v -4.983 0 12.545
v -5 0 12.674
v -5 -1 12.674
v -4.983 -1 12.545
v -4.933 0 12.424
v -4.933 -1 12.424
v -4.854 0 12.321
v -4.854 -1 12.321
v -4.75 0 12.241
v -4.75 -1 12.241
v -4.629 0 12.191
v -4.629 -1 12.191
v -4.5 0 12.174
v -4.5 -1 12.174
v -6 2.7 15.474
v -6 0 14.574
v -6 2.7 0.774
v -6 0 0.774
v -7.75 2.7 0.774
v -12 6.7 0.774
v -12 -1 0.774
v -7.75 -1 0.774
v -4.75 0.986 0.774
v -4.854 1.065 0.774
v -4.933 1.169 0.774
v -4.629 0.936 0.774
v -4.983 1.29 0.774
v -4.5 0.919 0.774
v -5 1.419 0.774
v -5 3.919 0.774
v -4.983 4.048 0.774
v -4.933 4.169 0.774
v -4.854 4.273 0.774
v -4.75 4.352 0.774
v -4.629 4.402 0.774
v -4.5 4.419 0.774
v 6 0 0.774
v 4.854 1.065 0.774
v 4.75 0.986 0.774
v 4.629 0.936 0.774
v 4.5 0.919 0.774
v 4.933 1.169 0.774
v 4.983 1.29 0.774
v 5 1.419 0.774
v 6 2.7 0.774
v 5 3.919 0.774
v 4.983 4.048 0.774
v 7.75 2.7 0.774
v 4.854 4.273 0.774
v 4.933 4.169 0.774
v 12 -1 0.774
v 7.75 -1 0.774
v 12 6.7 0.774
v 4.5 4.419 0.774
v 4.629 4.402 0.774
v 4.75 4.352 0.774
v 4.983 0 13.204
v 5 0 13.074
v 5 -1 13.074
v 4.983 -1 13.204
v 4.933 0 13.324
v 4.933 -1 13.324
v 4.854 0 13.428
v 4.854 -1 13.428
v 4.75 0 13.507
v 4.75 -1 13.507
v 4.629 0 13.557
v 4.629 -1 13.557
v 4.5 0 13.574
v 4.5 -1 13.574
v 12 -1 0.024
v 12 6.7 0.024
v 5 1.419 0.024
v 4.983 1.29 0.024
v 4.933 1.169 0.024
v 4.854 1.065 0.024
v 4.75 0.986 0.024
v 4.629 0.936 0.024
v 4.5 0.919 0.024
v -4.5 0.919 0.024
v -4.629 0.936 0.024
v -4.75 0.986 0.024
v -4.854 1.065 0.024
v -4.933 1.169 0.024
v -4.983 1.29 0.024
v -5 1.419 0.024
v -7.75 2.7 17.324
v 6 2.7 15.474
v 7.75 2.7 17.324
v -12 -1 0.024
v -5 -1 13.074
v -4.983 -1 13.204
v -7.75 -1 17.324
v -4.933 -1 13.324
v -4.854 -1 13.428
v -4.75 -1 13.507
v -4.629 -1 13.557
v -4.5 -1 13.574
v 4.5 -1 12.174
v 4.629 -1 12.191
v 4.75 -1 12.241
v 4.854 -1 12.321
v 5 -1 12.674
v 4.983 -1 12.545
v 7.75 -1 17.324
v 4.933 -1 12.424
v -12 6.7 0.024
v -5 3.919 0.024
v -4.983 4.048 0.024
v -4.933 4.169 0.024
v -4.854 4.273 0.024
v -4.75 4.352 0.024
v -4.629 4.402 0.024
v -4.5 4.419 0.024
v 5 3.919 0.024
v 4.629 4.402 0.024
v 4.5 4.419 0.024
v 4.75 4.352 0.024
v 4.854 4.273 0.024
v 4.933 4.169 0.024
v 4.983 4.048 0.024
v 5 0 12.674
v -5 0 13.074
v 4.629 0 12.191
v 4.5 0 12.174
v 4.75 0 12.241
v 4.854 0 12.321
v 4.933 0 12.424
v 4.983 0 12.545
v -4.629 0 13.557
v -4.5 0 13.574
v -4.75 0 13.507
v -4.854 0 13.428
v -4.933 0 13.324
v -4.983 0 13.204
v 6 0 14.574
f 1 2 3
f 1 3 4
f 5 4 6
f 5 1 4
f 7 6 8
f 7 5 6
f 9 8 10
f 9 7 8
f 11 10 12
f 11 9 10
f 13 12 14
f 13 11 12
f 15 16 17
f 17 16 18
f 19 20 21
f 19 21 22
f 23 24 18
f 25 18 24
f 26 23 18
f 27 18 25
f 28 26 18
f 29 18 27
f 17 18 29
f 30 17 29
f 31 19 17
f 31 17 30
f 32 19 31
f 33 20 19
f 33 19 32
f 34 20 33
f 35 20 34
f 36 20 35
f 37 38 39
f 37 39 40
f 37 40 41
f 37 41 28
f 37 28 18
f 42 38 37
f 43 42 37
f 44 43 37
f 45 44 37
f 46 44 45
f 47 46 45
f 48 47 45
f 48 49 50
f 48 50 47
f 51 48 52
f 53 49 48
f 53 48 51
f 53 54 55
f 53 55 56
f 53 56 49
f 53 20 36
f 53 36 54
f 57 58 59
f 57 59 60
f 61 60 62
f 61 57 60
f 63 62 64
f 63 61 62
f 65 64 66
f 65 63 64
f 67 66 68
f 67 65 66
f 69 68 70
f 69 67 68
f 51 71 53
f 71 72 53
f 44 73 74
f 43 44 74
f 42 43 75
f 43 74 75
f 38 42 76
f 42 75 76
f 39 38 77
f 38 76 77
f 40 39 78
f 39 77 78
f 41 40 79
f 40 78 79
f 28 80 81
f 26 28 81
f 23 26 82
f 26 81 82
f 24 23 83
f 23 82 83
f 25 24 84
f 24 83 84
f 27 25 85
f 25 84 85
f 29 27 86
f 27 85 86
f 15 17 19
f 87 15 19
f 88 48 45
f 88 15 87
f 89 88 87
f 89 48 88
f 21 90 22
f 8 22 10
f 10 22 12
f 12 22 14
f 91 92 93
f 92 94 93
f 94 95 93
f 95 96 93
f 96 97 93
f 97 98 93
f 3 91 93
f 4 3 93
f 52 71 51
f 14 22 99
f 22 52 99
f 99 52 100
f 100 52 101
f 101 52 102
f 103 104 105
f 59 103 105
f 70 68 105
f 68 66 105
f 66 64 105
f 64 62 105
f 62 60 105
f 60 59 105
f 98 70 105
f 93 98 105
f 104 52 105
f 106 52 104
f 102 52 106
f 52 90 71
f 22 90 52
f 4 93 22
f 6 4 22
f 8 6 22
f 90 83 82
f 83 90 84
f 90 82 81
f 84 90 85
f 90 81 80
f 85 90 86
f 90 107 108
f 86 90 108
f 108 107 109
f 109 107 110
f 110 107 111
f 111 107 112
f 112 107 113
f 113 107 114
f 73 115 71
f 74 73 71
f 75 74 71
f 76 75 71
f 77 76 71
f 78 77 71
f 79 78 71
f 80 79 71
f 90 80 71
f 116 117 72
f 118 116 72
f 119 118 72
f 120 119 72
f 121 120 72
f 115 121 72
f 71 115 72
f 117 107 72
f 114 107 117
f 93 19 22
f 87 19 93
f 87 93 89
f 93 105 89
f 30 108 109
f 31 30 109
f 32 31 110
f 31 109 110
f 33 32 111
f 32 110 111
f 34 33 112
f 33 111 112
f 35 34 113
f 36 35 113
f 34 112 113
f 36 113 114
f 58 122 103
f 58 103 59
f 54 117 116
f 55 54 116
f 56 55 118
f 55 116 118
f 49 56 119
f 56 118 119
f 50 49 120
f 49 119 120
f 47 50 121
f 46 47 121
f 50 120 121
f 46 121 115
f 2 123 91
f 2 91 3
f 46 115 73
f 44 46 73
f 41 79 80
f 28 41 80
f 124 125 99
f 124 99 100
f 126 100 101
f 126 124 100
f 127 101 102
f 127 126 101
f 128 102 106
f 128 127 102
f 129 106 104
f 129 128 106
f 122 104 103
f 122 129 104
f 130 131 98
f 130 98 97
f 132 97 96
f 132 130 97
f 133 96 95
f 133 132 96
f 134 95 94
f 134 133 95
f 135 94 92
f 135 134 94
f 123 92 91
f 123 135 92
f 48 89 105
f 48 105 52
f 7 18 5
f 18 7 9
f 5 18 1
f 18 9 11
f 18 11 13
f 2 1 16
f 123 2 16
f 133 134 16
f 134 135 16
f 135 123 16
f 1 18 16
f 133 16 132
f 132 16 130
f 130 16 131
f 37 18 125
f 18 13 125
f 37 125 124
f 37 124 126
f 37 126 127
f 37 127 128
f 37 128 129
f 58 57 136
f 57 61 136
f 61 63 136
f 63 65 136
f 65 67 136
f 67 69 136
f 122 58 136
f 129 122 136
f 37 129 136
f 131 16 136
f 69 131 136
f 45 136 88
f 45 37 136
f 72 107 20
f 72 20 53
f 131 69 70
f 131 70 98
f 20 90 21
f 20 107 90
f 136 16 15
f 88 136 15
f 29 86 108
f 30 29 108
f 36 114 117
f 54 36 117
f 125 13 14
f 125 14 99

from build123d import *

# Parameters (mm, degrees)
SKETCH4_W           = 13.5
SKETCH4_H           = 15.3
SKETCH4_W_2         = 12
SKETCH4_H_2         = 13.8
BOSS_EXTRUDE1_DEPTH = 2.7
SKETCH5_W           = 13.5
SKETCH5_H           = 15.3
BOSS_EXTRUDE2_DEPTH = 1
SKETCH6_W           = 24
SKETCH6_H           = 0.75
BOSS_EXTRUDE3_DEPTH = 4
CUT_EXTRUDE1_REACH  = 22.566
SKETCH8_W           = 5.25
SKETCH8_H           = 0.75
BOSS_EXTRUDE4_DEPTH = 3.7
SKETCH9_W           = 5.25
SKETCH9_H           = 0.75
BOSS_EXTRUDE5_DEPTH = 3.7
SKETCH10_W          = 13.5
SKETCH10_H          = 3.7
BOSS_EXTRUDE6_DEPTH = 2
CHAMFER1_SIZE       = 2.7
CHAMFER1_SIZE_2     = 0.9
SKETCH11_W          = 16.55
SKETCH11_H          = 3.7
BOSS_EXTRUDE7_DEPTH = 1
SKETCH12_W          = 16.55
SKETCH12_H          = 3.7
BOSS_EXTRUDE8_DEPTH = 1
CUT_EXTRUDE2_REACH  = 24.114


with BuildPart() as part:
    # Sketch4 → Boss-Extrude1 (new body)
    with BuildSketch(Plane(origin=(0, 0, 0), x_dir=(1, 0, 0), z_dir=(0, 1, 0))):
        with Locations((0, -7.674098898)):
            Rectangle(SKETCH4_W, SKETCH4_H)
        with Locations((0, -7.674098898)):
            Rectangle(SKETCH4_W_2, SKETCH4_H_2, mode=Mode.SUBTRACT)
    extrude(amount=BOSS_EXTRUDE1_DEPTH)

    # Sketch5 → Boss-Extrude2 (add)
    with BuildSketch(Plane.XZ):
        with Locations((0, 7.674098898)):
            Rectangle(SKETCH5_W, SKETCH5_H)
    extrude(amount=BOSS_EXTRUDE2_DEPTH)

    # Sketch6 → Boss-Extrude3 (add)
    with BuildSketch(Plane(origin=(0, 2.7, 0), x_dir=(1, 0, 0), z_dir=(0, 1, 0))):
        with Locations((0, -0.399098898)):
            Rectangle(SKETCH6_W, SKETCH6_H)
    extrude(amount=BOSS_EXTRUDE3_DEPTH)

    # Sketch7 → Cut-Extrude1 (cut, up to next)
    with BuildSketch(Plane(origin=(0, 0, 0.024098898), x_dir=(-1, 0, 0), z_dir=(0, 0, -1)), mode=Mode.PRIVATE) as cut_extrude1_sk1:
        with BuildLine():
            Line((-4.5, 0.919), (4.5, 0.919))
            ThreePointArc((4.5, 0.919), (4.853553391, 1.065446609), (5, 1.419))
            Line((5, 1.419), (5, 3.919))
            ThreePointArc((5, 3.919), (4.853553391, 4.272553391), (4.5, 4.419))
            Line((4.5, 4.419), (-4.5, 4.419))
            ThreePointArc((-4.5, 4.419), (-4.853553391, 4.272553391), (-5, 3.919))
            Line((-5, 3.919), (-5, 1.419))
            ThreePointArc((-5, 1.419), (-4.853553391, 1.065446609), (-4.5, 0.919))
        make_face()
    cut_extrude1_tool1 = extrude(cut_extrude1_sk1.sketch, amount=-CUT_EXTRUDE1_REACH, mode=Mode.PRIVATE) & part.part
    add(cut_extrude1_tool1.solids().sort_by_distance((0, 2.669, 0.024099))[0], mode=Mode.SUBTRACT)

    # Sketch8 → Boss-Extrude4 (add)
    with BuildSketch(Plane.XZ.offset(-2.7)):
        with Locations((9.375, 0.399098898)):
            Rectangle(SKETCH8_W, SKETCH8_H)
    extrude(amount=BOSS_EXTRUDE4_DEPTH)

    # Sketch9 → Boss-Extrude5 (add)
    with BuildSketch(Plane.XZ.offset(-2.7)):
        with Locations((-9.375, 0.399098898)):
            Rectangle(SKETCH9_W, SKETCH9_H)
    extrude(amount=BOSS_EXTRUDE5_DEPTH)

    # Sketch10 → Boss-Extrude6 (add)
    with BuildSketch(Plane.XY.offset(15.324098898)):
        with Locations((0, 0.85)):
            Rectangle(SKETCH10_W, SKETCH10_H)
    extrude(amount=BOSS_EXTRUDE6_DEPTH)

    # Chamfer1
    # the kernel refuses this chamfer: 2.7, 0.9 mm, written as the material it takes off along each edge
    with BuildSketch(Plane(origin=(-6, 2.7, 14.574098898), x_dir=(0, -0.9999257509361695, -0.012185754582199112), z_dir=(1, 0, 0))) as chamfer1_piece_1:
        Polygon((CHAMFER1_SIZE * 0.999925750936, -CHAMFER1_SIZE * 0.0121857545822), (-CHAMFER1_SIZE_2 * 0.0121857545822, -CHAMFER1_SIZE_2 * 0.999925750936), (0, 0), align=None)
    extrude(amount=12, mode=Mode.SUBTRACT)

    # Sketch11 → Boss-Extrude7 (add)
    with BuildSketch(Plane(origin=(6.75, 0, 0), x_dir=(0, 0, -1), z_dir=(1, 0, 0))):
        with Locations((-9.049098898, 0.85)):
            Rectangle(SKETCH11_W, SKETCH11_H)
    extrude(amount=BOSS_EXTRUDE7_DEPTH)

    # Sketch12 → Boss-Extrude8 (add)
    with BuildSketch(Plane.ZY.offset(6.75)):
        with Locations((9.049098898, 0.85)):
            Rectangle(SKETCH12_W, SKETCH12_H)
    extrude(amount=BOSS_EXTRUDE8_DEPTH)

    # Sketch13 → Cut-Extrude2 (cut, up to next)
    with BuildSketch(Plane(origin=(0, 0, 0), x_dir=(1, 0, 0), z_dir=(0, 1, 0)), mode=Mode.PRIVATE) as cut_extrude2_sk1:
        with BuildLine():
            Line((-4.5, -12.174098898), (4.5, -12.174098898))
            ThreePointArc((4.5, -12.174098898), (4.853553391, -12.320545507), (5, -12.674098898))
            Line((5, -12.674098898), (5, -13.074098898))
            ThreePointArc((5, -13.074098898), (4.853553391, -13.427652289), (4.5, -13.574098898))
            Line((4.5, -13.574098898), (-4.5, -13.574098898))
            ThreePointArc((-4.5, -13.574098898), (-4.853553391, -13.427652289), (-5, -13.074098898))
            Line((-5, -13.074098898), (-5, -12.674098898))
            ThreePointArc((-5, -12.674098898), (-4.853553391, -12.320545507), (-4.5, -12.174098898))
        make_face()
    cut_extrude2_tool1 = extrude(cut_extrude2_sk1.sketch, amount=-CUT_EXTRUDE2_REACH, mode=Mode.PRIVATE) & part.part
    add(cut_extrude2_tool1.solids().sort_by_distance((0, 0, 12.874099))[0], mode=Mode.SUBTRACT)


solid = part.part
